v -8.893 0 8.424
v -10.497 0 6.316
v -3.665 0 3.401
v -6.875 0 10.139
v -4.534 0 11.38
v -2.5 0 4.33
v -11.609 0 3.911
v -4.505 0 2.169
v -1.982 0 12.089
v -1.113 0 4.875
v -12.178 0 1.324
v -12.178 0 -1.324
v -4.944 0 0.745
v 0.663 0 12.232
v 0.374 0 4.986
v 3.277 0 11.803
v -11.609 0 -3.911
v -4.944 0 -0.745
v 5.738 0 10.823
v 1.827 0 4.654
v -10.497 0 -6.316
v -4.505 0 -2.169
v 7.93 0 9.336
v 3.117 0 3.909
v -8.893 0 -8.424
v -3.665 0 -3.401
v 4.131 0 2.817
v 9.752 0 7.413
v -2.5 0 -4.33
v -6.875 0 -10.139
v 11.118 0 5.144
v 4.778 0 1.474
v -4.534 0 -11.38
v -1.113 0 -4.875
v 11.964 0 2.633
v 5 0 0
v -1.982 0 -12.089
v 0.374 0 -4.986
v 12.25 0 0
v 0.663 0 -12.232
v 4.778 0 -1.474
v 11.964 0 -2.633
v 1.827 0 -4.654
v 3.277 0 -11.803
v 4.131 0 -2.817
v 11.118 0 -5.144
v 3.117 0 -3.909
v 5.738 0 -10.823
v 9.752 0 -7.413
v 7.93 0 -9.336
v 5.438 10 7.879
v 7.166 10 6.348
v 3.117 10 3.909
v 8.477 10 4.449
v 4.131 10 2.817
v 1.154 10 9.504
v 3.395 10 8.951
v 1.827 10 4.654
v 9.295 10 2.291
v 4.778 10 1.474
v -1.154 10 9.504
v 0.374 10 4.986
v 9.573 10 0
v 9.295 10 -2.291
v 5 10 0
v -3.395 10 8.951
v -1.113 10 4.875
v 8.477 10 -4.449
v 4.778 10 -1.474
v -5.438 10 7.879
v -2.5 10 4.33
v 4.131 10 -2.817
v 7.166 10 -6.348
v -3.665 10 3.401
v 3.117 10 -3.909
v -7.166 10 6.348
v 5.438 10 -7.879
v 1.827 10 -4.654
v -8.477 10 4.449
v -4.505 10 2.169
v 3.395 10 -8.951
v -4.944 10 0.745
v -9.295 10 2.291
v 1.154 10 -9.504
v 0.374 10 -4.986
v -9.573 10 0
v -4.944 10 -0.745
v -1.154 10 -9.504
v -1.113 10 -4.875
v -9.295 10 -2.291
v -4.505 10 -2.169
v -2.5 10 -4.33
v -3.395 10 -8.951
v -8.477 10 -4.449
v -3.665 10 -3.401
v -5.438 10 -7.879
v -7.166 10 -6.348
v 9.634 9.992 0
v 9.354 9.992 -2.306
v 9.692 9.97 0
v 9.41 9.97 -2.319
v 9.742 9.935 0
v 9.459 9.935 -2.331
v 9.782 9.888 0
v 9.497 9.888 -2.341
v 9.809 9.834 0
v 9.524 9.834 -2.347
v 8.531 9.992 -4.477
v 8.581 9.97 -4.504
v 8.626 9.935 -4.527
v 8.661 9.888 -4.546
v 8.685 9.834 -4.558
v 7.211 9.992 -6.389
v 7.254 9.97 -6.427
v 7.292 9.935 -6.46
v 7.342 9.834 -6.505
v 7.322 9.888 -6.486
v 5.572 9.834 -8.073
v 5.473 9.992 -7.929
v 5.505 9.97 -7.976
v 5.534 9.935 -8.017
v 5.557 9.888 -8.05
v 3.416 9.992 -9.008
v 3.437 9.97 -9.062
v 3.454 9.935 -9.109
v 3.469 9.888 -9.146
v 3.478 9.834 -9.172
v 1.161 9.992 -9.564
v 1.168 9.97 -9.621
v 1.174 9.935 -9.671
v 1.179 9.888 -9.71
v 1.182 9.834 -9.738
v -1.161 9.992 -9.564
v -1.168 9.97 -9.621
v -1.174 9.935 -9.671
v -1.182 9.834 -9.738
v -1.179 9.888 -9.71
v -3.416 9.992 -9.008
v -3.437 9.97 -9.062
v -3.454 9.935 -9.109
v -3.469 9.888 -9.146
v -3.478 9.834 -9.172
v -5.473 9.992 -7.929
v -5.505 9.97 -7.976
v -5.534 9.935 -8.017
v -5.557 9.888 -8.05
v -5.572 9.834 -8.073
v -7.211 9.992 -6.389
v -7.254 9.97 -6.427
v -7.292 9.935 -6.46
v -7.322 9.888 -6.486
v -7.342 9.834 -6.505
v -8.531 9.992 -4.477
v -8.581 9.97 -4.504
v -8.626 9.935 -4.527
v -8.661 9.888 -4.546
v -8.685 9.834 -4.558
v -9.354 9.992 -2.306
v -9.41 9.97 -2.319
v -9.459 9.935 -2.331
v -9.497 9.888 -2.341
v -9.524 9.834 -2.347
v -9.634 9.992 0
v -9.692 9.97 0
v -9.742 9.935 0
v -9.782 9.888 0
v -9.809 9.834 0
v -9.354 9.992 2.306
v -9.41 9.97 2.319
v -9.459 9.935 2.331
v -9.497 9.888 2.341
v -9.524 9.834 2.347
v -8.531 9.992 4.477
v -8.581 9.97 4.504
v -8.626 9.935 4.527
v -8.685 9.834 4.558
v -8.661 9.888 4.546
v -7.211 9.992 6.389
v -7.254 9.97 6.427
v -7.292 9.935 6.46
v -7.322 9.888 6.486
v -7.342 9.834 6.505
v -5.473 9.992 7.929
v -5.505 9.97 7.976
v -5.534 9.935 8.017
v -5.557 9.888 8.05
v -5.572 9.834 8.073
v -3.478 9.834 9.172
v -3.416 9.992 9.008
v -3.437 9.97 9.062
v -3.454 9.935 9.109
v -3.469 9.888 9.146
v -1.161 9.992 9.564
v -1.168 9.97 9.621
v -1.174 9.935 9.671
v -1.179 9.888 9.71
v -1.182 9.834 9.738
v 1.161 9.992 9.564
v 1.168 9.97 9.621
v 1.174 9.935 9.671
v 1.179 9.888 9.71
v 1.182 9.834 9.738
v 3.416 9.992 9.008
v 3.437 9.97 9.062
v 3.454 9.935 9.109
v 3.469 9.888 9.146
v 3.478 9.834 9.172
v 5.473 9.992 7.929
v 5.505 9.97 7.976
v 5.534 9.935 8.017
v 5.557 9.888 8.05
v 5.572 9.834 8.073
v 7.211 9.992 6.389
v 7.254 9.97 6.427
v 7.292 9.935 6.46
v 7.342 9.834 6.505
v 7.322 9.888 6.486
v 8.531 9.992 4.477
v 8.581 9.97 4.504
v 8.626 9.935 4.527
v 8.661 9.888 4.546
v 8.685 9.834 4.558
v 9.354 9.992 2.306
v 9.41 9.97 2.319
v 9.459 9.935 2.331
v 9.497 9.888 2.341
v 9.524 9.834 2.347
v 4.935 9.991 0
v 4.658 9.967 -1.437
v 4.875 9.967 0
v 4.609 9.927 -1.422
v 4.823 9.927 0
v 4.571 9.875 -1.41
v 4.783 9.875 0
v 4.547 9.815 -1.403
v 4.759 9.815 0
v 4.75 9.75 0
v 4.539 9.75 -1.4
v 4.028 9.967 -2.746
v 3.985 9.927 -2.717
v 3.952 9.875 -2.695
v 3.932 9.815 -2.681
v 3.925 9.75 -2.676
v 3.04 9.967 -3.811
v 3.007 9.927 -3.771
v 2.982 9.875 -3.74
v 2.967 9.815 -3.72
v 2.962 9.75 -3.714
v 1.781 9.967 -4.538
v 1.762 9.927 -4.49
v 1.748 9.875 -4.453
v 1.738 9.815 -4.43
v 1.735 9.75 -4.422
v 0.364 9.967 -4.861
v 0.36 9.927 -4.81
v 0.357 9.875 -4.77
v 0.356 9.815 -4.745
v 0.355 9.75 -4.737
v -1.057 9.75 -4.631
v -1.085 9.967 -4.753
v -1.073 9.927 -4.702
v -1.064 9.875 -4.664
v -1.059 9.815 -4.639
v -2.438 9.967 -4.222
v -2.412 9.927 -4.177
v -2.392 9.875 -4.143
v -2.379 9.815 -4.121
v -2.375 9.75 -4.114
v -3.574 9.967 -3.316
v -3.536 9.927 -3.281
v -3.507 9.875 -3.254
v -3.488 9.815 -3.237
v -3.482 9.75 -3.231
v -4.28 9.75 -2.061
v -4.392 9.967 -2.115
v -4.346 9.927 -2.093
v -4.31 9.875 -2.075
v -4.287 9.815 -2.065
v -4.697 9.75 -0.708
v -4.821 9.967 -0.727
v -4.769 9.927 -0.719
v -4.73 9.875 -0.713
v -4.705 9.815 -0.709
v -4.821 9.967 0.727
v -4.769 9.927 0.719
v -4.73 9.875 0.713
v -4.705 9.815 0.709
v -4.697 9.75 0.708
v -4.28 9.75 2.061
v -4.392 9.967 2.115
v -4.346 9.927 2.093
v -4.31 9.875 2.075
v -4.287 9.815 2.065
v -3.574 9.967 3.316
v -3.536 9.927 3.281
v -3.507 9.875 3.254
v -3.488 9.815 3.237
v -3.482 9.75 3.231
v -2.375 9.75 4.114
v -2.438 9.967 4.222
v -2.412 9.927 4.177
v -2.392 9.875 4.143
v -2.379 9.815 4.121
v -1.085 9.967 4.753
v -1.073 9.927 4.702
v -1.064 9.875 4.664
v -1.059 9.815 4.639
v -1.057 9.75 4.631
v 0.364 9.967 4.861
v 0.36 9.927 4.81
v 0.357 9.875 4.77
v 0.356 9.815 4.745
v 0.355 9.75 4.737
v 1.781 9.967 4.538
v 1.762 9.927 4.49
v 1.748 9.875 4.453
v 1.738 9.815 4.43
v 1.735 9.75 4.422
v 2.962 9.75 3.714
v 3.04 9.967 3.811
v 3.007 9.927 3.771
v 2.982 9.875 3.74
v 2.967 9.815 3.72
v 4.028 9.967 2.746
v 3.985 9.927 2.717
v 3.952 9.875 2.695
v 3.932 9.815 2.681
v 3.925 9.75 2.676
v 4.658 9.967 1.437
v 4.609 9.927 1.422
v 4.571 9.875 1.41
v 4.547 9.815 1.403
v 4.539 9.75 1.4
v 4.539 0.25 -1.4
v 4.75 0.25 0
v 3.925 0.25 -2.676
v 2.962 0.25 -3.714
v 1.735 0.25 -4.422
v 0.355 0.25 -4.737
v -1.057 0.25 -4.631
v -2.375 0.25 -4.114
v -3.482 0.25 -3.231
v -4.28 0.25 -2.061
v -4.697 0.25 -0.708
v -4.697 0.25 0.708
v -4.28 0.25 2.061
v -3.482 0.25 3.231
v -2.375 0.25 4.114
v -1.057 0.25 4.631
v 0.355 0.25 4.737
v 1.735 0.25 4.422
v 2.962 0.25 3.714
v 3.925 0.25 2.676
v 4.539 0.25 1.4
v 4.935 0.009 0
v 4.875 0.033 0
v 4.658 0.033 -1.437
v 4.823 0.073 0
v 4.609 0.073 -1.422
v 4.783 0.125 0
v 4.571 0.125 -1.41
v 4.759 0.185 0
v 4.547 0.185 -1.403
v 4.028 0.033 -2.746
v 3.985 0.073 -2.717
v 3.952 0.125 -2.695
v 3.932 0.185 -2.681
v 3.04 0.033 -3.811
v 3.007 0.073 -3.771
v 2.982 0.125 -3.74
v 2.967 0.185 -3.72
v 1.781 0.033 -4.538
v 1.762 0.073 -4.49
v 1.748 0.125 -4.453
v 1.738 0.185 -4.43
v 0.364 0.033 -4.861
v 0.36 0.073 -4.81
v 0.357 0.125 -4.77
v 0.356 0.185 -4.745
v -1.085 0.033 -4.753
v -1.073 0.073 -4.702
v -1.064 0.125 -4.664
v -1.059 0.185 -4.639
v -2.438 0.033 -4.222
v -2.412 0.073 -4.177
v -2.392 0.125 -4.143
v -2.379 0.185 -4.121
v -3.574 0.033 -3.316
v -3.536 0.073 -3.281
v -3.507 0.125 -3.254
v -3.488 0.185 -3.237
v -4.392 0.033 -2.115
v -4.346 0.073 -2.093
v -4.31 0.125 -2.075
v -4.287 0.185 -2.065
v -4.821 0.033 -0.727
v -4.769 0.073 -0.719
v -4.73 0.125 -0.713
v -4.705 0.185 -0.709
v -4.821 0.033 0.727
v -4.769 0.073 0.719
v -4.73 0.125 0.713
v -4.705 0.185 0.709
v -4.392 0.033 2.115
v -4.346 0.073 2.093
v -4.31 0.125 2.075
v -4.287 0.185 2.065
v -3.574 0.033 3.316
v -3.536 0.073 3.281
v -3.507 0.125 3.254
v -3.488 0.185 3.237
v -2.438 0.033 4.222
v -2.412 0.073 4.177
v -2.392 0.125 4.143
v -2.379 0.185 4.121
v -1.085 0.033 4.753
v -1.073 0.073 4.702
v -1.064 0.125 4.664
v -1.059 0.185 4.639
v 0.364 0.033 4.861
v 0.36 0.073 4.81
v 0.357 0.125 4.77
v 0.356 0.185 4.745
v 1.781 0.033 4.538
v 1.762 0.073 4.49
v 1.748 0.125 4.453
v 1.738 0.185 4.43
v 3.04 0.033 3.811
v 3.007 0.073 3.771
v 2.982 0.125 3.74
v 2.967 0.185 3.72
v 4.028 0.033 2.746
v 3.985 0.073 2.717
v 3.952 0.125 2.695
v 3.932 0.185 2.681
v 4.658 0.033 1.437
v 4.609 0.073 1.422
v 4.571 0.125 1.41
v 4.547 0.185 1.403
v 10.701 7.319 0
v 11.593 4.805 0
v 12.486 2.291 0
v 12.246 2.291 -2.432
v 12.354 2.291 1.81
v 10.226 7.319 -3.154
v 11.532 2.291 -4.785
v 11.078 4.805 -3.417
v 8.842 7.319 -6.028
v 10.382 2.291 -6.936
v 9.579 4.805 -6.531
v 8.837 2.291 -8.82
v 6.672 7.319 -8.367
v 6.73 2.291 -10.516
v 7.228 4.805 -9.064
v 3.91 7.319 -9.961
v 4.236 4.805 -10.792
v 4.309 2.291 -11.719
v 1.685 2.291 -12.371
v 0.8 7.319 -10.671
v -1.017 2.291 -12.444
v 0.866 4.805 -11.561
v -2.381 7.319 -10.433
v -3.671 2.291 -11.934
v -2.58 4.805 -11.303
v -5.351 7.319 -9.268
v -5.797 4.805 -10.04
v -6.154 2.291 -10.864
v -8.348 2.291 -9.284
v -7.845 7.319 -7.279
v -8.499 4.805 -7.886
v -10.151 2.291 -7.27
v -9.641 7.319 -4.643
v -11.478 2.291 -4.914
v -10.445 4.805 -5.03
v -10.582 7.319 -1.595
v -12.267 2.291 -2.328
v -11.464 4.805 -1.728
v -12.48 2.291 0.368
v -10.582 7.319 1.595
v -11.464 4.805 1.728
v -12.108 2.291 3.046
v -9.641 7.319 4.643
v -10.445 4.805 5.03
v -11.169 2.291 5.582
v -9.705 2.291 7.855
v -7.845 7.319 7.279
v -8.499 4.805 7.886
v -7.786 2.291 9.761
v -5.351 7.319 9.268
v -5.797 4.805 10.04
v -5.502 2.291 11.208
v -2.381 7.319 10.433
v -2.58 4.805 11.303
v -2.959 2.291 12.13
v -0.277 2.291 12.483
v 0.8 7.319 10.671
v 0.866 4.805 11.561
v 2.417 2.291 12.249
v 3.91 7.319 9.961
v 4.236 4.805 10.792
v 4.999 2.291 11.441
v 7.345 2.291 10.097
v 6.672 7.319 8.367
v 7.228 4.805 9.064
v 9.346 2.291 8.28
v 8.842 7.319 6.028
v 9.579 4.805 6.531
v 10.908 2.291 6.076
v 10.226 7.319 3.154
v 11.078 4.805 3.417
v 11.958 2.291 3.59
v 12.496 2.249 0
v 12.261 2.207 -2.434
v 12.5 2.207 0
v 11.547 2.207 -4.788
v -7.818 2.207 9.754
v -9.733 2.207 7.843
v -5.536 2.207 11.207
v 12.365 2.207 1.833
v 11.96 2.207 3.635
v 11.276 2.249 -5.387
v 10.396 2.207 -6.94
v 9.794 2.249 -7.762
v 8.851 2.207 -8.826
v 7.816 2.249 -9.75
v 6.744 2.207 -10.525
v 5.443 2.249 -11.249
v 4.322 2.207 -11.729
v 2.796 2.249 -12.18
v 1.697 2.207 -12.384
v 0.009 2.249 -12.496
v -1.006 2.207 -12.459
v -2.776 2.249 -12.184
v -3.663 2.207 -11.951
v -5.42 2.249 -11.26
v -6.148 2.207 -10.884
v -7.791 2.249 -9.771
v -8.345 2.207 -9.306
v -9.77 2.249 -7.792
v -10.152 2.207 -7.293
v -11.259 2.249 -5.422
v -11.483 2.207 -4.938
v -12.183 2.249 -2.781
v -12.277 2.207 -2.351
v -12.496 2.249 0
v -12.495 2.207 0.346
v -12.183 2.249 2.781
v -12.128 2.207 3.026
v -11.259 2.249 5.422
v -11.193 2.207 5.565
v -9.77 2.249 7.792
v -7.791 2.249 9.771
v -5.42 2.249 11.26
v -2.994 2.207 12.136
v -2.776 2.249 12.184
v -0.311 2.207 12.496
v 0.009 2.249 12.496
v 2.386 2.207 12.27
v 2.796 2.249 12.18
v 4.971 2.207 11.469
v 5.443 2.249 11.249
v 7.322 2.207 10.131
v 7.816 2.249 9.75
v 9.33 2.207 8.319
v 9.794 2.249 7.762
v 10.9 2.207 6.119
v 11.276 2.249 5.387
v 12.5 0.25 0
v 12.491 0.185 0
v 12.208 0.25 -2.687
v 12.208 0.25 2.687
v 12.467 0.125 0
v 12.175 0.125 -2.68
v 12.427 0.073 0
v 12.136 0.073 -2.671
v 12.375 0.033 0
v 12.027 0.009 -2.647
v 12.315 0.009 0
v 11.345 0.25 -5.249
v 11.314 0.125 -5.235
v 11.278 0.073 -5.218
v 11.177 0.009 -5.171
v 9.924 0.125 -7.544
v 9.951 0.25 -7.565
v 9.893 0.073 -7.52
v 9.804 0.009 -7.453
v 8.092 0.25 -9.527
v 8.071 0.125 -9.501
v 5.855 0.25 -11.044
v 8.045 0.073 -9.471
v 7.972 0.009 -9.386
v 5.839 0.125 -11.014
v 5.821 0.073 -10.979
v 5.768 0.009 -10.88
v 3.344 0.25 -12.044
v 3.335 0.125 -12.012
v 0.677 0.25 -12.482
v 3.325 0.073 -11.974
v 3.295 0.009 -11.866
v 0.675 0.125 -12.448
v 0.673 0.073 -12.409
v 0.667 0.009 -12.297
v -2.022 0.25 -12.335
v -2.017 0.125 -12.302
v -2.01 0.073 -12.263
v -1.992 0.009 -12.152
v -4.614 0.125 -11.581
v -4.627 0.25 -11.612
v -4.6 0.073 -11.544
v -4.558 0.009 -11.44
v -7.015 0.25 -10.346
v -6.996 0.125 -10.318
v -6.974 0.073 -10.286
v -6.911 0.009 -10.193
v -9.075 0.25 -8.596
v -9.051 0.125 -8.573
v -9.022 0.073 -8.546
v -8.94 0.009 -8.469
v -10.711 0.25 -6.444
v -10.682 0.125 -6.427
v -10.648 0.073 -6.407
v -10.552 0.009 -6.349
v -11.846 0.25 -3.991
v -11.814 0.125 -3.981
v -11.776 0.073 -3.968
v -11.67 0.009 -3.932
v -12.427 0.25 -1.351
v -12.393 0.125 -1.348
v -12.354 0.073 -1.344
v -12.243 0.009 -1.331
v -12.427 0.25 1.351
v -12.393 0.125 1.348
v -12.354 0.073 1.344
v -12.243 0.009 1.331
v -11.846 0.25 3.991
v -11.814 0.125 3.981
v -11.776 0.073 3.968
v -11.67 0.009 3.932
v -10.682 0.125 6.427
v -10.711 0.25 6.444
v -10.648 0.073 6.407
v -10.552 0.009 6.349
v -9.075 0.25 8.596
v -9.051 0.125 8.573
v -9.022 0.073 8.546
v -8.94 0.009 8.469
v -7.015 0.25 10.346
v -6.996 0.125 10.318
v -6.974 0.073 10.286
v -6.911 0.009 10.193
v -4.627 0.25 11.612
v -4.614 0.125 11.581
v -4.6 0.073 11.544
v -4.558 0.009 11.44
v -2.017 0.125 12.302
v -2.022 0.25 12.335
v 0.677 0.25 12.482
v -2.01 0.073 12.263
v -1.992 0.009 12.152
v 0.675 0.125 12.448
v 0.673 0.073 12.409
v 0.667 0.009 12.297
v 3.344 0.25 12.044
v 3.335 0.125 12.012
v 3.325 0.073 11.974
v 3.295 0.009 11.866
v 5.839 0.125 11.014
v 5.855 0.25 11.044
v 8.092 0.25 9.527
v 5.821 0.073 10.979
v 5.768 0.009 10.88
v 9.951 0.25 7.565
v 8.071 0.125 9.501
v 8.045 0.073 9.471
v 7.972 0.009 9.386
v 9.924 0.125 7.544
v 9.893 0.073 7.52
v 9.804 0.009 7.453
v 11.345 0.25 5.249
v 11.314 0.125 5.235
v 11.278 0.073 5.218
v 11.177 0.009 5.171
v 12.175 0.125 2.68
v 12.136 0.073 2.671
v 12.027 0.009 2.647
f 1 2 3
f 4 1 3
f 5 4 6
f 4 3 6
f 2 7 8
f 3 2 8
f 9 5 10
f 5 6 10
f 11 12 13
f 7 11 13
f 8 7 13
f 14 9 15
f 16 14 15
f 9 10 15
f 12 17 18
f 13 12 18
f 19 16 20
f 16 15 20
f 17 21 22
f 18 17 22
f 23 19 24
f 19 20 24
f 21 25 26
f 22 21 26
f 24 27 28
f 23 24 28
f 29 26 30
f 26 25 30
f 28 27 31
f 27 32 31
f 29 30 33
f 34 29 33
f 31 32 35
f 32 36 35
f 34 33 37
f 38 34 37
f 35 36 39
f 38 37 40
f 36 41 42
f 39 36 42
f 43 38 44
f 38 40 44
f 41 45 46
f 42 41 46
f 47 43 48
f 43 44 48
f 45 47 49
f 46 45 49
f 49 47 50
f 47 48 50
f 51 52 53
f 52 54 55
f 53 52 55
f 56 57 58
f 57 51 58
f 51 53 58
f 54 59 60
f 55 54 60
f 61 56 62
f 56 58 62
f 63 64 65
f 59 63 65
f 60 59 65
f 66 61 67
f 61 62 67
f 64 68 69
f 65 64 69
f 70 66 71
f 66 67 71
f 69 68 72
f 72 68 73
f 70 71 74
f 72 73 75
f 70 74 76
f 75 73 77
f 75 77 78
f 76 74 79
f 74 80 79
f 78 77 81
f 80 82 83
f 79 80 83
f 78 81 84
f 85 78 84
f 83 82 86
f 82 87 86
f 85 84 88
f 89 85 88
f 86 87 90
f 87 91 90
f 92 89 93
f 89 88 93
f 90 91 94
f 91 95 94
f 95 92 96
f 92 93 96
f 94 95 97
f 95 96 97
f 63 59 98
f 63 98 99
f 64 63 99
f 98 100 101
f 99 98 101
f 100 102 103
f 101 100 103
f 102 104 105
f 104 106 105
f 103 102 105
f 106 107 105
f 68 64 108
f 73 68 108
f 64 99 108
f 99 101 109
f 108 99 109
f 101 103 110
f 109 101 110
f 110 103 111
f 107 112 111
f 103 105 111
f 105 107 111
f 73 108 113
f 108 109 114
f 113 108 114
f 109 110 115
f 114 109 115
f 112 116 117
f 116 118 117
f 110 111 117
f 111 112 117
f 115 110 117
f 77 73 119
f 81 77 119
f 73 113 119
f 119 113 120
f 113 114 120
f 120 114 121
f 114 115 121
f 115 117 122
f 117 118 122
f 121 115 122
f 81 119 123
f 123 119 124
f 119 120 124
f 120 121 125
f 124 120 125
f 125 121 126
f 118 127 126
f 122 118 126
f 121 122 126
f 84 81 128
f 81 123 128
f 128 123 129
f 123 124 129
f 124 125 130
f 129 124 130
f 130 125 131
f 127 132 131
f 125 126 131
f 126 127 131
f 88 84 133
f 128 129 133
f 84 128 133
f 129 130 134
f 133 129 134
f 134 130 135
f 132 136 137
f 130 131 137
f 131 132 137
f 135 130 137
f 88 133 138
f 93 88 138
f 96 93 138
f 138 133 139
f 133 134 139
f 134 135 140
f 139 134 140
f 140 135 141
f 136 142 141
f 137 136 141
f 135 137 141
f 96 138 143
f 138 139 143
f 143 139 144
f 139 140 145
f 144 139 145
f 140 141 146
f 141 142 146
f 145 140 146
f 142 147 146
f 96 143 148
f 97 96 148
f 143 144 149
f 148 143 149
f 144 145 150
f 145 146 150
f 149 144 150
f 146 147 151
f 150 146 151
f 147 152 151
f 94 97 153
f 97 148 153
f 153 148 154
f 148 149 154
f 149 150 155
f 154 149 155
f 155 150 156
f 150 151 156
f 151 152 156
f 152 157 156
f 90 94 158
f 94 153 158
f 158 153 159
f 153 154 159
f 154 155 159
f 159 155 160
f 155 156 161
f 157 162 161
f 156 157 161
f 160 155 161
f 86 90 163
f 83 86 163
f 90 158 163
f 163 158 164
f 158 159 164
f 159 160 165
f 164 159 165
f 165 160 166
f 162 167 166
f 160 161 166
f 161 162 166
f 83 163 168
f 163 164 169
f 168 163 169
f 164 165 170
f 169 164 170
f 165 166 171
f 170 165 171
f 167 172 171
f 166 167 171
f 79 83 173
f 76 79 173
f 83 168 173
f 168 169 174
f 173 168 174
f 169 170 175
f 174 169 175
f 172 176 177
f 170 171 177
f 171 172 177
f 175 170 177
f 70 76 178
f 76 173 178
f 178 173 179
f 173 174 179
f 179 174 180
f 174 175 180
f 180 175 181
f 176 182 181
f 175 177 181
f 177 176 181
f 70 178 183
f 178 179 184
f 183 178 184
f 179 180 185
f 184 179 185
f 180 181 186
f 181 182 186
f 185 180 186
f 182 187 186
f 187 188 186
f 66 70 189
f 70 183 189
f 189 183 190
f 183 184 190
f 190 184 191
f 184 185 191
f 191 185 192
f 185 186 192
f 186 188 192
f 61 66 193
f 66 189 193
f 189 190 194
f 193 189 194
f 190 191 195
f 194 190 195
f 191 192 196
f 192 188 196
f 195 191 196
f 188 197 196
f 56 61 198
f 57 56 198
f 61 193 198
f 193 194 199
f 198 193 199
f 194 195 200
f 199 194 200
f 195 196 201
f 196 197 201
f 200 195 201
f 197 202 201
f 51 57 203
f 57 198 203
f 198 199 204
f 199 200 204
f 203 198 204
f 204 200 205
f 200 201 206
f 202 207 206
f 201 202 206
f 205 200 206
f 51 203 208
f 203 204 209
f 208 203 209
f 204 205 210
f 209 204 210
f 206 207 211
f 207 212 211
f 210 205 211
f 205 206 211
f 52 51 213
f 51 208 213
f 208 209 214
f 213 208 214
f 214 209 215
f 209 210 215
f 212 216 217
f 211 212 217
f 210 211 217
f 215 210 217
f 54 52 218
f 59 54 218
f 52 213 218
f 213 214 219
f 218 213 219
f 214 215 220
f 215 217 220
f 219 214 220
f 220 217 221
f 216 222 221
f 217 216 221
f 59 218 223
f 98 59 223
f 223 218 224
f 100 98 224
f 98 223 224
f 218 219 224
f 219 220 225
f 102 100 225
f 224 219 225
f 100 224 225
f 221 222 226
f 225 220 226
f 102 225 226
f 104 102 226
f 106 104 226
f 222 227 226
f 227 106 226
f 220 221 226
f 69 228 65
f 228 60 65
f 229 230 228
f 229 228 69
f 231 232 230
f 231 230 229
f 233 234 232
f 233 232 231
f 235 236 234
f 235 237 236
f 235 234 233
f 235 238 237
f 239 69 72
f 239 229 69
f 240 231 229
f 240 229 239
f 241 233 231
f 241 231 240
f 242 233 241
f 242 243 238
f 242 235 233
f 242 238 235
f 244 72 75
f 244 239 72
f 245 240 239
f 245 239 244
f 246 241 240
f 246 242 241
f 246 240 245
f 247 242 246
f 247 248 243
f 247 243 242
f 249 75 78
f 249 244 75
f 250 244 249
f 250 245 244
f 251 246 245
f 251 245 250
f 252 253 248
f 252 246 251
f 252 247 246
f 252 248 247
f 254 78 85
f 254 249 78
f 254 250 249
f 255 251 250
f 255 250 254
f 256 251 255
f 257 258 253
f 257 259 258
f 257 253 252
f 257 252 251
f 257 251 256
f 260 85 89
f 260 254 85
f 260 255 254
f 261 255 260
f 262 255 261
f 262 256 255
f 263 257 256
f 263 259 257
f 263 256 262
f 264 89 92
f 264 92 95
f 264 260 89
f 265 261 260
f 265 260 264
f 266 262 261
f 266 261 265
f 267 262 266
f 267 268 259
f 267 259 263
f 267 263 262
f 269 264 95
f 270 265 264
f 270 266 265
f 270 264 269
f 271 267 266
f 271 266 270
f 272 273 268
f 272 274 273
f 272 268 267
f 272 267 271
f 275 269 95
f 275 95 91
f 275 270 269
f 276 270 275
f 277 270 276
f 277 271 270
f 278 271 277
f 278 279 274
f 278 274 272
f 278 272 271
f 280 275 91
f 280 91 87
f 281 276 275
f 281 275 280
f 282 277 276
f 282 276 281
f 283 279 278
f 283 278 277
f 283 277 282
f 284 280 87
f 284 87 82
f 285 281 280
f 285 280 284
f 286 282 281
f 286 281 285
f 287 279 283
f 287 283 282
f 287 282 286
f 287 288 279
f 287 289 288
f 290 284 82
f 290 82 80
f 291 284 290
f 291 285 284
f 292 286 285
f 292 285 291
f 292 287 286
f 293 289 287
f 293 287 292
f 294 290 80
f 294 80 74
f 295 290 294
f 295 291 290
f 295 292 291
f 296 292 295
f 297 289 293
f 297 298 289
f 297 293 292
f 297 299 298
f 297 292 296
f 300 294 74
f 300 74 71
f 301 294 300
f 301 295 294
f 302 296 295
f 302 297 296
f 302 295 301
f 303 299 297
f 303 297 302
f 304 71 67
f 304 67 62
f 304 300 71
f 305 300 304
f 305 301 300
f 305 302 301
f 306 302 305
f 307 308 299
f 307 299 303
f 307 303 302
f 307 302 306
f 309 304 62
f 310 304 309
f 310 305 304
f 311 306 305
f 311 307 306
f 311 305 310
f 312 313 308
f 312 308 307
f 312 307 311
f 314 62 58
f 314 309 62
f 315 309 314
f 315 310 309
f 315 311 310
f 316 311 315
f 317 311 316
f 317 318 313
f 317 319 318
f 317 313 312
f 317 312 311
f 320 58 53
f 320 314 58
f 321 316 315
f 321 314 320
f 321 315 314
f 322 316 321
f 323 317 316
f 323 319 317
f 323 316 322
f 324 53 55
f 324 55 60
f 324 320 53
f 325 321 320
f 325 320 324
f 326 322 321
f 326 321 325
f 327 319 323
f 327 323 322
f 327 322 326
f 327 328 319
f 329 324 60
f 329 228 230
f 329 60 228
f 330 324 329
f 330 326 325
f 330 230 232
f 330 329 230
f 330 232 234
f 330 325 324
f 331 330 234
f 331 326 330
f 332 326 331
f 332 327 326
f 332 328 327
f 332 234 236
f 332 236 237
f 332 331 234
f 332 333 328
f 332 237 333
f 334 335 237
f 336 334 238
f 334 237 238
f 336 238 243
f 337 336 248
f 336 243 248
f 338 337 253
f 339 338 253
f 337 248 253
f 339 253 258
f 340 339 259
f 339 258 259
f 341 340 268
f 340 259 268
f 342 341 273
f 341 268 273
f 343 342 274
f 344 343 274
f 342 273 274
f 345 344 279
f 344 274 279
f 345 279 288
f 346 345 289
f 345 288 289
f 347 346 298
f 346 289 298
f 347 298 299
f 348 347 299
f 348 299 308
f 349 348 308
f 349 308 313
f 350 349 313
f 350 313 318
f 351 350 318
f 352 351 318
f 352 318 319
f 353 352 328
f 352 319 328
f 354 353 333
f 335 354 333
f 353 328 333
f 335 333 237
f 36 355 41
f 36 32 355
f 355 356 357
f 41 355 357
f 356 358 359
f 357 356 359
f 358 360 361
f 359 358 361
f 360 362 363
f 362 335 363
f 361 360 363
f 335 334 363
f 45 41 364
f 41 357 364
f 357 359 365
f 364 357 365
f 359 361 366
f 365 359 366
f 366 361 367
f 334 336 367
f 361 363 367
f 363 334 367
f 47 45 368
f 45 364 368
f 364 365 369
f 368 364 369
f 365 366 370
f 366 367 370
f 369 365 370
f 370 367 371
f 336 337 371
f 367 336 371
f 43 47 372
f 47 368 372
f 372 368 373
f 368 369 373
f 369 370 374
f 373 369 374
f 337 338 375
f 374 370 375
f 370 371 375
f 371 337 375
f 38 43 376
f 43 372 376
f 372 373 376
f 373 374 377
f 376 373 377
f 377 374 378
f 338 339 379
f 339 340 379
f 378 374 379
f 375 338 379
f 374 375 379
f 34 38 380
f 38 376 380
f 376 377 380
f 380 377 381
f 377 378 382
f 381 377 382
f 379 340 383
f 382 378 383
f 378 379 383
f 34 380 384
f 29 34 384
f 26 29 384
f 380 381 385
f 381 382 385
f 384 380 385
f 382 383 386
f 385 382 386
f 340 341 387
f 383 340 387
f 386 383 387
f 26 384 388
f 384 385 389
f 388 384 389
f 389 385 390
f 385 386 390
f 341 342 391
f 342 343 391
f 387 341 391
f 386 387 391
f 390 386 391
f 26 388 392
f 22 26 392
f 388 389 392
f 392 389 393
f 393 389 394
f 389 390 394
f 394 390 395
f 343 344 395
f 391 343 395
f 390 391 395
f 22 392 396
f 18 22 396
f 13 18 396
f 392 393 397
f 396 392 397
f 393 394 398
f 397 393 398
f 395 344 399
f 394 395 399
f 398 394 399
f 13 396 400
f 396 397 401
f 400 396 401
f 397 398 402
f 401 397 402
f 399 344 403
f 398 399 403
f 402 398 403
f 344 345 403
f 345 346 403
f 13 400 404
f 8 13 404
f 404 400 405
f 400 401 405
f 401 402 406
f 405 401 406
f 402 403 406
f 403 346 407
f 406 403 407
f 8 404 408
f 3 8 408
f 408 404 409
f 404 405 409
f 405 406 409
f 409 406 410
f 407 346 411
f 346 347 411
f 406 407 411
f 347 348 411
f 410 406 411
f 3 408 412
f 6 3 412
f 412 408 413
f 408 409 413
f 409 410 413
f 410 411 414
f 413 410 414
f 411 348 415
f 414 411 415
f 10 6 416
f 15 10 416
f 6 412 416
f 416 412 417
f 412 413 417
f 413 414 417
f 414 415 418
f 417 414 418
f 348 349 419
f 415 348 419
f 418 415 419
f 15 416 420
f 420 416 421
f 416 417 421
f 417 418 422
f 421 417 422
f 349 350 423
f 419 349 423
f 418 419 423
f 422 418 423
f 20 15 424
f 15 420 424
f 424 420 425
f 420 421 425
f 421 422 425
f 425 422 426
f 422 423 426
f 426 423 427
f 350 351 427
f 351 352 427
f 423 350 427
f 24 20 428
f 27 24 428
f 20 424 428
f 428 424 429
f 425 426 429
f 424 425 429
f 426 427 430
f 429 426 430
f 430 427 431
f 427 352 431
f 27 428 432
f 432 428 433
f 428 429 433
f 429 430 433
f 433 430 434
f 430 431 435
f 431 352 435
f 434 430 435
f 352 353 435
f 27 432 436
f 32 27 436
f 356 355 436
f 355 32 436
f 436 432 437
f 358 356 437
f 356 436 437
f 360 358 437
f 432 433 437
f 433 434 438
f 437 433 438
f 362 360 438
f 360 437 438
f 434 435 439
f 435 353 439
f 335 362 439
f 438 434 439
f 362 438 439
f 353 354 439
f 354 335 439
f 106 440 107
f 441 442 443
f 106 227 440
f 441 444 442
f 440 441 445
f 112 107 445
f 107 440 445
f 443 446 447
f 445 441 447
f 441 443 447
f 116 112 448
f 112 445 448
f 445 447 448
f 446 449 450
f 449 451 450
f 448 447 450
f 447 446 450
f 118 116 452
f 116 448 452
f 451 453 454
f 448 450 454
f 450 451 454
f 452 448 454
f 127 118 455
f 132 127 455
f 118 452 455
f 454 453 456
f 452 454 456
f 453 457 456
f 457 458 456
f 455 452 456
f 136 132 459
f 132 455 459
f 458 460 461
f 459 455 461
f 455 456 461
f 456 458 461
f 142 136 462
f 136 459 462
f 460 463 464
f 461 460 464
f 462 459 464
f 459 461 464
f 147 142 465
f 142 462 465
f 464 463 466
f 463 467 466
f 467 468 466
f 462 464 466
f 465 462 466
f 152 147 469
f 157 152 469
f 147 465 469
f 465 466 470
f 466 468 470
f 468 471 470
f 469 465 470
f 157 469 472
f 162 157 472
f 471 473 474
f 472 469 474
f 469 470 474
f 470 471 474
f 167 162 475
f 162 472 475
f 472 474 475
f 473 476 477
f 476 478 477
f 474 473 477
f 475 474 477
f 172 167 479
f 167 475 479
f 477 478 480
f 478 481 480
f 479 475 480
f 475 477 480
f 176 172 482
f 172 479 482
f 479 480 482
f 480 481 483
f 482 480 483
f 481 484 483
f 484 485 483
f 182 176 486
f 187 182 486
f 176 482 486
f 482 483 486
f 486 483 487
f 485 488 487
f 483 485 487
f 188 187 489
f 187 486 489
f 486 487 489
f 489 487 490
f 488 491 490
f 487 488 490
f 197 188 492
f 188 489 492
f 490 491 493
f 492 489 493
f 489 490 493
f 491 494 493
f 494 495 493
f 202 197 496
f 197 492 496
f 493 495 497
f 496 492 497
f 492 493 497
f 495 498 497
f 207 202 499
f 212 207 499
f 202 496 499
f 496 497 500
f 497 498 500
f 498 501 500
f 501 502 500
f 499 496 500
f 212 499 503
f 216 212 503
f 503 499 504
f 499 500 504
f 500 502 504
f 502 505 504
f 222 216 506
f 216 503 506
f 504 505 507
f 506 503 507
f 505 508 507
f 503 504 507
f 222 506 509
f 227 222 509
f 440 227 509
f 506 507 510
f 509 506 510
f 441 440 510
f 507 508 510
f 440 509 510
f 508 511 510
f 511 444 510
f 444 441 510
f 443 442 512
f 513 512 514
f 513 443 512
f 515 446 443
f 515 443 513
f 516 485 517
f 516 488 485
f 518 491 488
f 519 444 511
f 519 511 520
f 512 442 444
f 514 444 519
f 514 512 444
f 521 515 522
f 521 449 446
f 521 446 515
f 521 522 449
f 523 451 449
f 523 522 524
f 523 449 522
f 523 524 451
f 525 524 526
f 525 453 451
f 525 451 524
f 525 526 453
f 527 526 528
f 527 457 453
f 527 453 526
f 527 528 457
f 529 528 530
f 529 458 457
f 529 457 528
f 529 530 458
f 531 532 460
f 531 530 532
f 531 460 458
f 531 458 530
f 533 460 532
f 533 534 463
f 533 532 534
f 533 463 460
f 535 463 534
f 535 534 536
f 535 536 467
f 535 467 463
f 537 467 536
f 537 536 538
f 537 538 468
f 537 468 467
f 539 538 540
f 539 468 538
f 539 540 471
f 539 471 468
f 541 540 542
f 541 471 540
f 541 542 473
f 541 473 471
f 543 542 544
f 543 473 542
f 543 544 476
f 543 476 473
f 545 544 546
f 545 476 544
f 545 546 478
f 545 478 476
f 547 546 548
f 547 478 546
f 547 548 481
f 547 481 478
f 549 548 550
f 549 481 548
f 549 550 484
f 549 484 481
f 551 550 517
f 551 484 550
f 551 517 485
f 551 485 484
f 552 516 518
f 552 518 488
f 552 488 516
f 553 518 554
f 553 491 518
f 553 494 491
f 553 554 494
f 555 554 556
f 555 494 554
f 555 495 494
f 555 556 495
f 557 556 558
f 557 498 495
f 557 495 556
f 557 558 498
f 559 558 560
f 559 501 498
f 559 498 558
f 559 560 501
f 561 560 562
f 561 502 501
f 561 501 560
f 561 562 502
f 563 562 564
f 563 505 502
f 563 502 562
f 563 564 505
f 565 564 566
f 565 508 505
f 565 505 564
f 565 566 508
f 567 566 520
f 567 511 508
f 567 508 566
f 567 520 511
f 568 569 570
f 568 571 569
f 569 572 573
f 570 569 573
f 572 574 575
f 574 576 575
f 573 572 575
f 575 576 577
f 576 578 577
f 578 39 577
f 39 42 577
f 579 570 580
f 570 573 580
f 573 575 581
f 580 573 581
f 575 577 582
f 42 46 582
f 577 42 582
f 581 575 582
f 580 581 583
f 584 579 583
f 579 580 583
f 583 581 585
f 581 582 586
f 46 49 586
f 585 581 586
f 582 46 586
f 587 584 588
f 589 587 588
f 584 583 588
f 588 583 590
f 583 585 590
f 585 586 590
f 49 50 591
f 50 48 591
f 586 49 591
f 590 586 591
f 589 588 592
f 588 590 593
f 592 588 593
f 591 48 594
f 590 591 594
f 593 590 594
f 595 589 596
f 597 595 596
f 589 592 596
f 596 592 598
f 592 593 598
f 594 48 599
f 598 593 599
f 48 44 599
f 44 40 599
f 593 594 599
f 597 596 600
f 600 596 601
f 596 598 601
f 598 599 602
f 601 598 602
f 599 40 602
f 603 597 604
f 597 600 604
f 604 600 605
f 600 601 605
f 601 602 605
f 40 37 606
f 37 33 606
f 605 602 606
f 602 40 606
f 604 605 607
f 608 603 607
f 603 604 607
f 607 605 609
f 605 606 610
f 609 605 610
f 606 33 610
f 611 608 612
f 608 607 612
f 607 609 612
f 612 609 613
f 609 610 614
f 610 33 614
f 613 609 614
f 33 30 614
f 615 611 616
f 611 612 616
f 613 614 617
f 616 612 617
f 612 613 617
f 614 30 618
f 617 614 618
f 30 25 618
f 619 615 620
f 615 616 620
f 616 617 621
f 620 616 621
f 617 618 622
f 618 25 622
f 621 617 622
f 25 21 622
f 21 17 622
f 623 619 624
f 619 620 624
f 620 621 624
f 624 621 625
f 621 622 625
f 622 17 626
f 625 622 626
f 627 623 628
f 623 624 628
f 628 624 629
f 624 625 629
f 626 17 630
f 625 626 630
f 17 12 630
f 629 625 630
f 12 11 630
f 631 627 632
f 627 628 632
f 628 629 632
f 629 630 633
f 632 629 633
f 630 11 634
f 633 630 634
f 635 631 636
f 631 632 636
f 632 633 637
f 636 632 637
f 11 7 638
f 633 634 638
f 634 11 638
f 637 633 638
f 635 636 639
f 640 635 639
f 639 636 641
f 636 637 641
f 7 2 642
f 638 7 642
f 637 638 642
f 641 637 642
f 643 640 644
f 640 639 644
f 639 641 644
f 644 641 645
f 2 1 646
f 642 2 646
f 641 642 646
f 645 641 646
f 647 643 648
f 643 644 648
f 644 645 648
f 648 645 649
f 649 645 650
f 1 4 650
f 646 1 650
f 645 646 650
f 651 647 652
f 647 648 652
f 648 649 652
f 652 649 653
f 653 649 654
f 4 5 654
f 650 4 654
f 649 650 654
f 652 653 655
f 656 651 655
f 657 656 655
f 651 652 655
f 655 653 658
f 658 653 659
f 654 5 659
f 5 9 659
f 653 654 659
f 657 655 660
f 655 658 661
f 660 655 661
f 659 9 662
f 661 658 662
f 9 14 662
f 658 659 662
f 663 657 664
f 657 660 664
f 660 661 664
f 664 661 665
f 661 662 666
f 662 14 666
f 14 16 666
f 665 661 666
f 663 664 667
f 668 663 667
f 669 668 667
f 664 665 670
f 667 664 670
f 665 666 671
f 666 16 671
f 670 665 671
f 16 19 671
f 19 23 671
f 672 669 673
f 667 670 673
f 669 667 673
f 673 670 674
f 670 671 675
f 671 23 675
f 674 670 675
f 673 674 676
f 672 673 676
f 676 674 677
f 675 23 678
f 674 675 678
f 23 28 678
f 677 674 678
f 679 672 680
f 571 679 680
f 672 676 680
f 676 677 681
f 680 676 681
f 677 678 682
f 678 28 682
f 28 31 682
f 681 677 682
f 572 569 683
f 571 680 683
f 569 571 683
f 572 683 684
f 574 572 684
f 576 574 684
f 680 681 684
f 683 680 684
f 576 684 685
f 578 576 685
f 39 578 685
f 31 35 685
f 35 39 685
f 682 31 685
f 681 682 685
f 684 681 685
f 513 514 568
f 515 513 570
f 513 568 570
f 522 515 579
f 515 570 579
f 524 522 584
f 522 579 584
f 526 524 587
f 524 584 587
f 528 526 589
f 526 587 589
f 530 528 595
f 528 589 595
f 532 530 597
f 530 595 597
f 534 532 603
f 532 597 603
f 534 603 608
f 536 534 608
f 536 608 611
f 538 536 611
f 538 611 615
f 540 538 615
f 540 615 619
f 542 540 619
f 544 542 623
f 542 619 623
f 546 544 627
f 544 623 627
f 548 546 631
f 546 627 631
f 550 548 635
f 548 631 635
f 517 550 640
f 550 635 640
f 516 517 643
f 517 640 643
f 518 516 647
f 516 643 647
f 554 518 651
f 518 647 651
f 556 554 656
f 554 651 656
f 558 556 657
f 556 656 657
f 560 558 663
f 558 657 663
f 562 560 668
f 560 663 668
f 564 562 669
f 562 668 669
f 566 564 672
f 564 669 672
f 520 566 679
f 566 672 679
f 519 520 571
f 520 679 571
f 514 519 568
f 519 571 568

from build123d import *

# Parameters (mm, degrees)
FILLET1_R = 0.25


with BuildPart() as part:
    # Sketch1 → Revolve1 (revolve)
    with BuildSketch(Plane.XY):
        Polygon((4.75, 10), (9.75, 10), (12.5, 2.25), (12.5, 0), (4.75, 0), align=None)
    revolve(axis=Axis((0, 0, 0), (0, 1, 0)))

    # Fillet1
    fillet1_edges = [part.edges().sort_by_distance(p)[0] for p in [
        (-4.75, 0, 0),
        (-12.5, 0, 0),
        (-12.5, 2.25, 0),
        (-9.75, 10, 0),
        (-4.75, 10, 0),
    ]]
    fillet(fillet1_edges, radius=FILLET1_R)


solid = part.part
